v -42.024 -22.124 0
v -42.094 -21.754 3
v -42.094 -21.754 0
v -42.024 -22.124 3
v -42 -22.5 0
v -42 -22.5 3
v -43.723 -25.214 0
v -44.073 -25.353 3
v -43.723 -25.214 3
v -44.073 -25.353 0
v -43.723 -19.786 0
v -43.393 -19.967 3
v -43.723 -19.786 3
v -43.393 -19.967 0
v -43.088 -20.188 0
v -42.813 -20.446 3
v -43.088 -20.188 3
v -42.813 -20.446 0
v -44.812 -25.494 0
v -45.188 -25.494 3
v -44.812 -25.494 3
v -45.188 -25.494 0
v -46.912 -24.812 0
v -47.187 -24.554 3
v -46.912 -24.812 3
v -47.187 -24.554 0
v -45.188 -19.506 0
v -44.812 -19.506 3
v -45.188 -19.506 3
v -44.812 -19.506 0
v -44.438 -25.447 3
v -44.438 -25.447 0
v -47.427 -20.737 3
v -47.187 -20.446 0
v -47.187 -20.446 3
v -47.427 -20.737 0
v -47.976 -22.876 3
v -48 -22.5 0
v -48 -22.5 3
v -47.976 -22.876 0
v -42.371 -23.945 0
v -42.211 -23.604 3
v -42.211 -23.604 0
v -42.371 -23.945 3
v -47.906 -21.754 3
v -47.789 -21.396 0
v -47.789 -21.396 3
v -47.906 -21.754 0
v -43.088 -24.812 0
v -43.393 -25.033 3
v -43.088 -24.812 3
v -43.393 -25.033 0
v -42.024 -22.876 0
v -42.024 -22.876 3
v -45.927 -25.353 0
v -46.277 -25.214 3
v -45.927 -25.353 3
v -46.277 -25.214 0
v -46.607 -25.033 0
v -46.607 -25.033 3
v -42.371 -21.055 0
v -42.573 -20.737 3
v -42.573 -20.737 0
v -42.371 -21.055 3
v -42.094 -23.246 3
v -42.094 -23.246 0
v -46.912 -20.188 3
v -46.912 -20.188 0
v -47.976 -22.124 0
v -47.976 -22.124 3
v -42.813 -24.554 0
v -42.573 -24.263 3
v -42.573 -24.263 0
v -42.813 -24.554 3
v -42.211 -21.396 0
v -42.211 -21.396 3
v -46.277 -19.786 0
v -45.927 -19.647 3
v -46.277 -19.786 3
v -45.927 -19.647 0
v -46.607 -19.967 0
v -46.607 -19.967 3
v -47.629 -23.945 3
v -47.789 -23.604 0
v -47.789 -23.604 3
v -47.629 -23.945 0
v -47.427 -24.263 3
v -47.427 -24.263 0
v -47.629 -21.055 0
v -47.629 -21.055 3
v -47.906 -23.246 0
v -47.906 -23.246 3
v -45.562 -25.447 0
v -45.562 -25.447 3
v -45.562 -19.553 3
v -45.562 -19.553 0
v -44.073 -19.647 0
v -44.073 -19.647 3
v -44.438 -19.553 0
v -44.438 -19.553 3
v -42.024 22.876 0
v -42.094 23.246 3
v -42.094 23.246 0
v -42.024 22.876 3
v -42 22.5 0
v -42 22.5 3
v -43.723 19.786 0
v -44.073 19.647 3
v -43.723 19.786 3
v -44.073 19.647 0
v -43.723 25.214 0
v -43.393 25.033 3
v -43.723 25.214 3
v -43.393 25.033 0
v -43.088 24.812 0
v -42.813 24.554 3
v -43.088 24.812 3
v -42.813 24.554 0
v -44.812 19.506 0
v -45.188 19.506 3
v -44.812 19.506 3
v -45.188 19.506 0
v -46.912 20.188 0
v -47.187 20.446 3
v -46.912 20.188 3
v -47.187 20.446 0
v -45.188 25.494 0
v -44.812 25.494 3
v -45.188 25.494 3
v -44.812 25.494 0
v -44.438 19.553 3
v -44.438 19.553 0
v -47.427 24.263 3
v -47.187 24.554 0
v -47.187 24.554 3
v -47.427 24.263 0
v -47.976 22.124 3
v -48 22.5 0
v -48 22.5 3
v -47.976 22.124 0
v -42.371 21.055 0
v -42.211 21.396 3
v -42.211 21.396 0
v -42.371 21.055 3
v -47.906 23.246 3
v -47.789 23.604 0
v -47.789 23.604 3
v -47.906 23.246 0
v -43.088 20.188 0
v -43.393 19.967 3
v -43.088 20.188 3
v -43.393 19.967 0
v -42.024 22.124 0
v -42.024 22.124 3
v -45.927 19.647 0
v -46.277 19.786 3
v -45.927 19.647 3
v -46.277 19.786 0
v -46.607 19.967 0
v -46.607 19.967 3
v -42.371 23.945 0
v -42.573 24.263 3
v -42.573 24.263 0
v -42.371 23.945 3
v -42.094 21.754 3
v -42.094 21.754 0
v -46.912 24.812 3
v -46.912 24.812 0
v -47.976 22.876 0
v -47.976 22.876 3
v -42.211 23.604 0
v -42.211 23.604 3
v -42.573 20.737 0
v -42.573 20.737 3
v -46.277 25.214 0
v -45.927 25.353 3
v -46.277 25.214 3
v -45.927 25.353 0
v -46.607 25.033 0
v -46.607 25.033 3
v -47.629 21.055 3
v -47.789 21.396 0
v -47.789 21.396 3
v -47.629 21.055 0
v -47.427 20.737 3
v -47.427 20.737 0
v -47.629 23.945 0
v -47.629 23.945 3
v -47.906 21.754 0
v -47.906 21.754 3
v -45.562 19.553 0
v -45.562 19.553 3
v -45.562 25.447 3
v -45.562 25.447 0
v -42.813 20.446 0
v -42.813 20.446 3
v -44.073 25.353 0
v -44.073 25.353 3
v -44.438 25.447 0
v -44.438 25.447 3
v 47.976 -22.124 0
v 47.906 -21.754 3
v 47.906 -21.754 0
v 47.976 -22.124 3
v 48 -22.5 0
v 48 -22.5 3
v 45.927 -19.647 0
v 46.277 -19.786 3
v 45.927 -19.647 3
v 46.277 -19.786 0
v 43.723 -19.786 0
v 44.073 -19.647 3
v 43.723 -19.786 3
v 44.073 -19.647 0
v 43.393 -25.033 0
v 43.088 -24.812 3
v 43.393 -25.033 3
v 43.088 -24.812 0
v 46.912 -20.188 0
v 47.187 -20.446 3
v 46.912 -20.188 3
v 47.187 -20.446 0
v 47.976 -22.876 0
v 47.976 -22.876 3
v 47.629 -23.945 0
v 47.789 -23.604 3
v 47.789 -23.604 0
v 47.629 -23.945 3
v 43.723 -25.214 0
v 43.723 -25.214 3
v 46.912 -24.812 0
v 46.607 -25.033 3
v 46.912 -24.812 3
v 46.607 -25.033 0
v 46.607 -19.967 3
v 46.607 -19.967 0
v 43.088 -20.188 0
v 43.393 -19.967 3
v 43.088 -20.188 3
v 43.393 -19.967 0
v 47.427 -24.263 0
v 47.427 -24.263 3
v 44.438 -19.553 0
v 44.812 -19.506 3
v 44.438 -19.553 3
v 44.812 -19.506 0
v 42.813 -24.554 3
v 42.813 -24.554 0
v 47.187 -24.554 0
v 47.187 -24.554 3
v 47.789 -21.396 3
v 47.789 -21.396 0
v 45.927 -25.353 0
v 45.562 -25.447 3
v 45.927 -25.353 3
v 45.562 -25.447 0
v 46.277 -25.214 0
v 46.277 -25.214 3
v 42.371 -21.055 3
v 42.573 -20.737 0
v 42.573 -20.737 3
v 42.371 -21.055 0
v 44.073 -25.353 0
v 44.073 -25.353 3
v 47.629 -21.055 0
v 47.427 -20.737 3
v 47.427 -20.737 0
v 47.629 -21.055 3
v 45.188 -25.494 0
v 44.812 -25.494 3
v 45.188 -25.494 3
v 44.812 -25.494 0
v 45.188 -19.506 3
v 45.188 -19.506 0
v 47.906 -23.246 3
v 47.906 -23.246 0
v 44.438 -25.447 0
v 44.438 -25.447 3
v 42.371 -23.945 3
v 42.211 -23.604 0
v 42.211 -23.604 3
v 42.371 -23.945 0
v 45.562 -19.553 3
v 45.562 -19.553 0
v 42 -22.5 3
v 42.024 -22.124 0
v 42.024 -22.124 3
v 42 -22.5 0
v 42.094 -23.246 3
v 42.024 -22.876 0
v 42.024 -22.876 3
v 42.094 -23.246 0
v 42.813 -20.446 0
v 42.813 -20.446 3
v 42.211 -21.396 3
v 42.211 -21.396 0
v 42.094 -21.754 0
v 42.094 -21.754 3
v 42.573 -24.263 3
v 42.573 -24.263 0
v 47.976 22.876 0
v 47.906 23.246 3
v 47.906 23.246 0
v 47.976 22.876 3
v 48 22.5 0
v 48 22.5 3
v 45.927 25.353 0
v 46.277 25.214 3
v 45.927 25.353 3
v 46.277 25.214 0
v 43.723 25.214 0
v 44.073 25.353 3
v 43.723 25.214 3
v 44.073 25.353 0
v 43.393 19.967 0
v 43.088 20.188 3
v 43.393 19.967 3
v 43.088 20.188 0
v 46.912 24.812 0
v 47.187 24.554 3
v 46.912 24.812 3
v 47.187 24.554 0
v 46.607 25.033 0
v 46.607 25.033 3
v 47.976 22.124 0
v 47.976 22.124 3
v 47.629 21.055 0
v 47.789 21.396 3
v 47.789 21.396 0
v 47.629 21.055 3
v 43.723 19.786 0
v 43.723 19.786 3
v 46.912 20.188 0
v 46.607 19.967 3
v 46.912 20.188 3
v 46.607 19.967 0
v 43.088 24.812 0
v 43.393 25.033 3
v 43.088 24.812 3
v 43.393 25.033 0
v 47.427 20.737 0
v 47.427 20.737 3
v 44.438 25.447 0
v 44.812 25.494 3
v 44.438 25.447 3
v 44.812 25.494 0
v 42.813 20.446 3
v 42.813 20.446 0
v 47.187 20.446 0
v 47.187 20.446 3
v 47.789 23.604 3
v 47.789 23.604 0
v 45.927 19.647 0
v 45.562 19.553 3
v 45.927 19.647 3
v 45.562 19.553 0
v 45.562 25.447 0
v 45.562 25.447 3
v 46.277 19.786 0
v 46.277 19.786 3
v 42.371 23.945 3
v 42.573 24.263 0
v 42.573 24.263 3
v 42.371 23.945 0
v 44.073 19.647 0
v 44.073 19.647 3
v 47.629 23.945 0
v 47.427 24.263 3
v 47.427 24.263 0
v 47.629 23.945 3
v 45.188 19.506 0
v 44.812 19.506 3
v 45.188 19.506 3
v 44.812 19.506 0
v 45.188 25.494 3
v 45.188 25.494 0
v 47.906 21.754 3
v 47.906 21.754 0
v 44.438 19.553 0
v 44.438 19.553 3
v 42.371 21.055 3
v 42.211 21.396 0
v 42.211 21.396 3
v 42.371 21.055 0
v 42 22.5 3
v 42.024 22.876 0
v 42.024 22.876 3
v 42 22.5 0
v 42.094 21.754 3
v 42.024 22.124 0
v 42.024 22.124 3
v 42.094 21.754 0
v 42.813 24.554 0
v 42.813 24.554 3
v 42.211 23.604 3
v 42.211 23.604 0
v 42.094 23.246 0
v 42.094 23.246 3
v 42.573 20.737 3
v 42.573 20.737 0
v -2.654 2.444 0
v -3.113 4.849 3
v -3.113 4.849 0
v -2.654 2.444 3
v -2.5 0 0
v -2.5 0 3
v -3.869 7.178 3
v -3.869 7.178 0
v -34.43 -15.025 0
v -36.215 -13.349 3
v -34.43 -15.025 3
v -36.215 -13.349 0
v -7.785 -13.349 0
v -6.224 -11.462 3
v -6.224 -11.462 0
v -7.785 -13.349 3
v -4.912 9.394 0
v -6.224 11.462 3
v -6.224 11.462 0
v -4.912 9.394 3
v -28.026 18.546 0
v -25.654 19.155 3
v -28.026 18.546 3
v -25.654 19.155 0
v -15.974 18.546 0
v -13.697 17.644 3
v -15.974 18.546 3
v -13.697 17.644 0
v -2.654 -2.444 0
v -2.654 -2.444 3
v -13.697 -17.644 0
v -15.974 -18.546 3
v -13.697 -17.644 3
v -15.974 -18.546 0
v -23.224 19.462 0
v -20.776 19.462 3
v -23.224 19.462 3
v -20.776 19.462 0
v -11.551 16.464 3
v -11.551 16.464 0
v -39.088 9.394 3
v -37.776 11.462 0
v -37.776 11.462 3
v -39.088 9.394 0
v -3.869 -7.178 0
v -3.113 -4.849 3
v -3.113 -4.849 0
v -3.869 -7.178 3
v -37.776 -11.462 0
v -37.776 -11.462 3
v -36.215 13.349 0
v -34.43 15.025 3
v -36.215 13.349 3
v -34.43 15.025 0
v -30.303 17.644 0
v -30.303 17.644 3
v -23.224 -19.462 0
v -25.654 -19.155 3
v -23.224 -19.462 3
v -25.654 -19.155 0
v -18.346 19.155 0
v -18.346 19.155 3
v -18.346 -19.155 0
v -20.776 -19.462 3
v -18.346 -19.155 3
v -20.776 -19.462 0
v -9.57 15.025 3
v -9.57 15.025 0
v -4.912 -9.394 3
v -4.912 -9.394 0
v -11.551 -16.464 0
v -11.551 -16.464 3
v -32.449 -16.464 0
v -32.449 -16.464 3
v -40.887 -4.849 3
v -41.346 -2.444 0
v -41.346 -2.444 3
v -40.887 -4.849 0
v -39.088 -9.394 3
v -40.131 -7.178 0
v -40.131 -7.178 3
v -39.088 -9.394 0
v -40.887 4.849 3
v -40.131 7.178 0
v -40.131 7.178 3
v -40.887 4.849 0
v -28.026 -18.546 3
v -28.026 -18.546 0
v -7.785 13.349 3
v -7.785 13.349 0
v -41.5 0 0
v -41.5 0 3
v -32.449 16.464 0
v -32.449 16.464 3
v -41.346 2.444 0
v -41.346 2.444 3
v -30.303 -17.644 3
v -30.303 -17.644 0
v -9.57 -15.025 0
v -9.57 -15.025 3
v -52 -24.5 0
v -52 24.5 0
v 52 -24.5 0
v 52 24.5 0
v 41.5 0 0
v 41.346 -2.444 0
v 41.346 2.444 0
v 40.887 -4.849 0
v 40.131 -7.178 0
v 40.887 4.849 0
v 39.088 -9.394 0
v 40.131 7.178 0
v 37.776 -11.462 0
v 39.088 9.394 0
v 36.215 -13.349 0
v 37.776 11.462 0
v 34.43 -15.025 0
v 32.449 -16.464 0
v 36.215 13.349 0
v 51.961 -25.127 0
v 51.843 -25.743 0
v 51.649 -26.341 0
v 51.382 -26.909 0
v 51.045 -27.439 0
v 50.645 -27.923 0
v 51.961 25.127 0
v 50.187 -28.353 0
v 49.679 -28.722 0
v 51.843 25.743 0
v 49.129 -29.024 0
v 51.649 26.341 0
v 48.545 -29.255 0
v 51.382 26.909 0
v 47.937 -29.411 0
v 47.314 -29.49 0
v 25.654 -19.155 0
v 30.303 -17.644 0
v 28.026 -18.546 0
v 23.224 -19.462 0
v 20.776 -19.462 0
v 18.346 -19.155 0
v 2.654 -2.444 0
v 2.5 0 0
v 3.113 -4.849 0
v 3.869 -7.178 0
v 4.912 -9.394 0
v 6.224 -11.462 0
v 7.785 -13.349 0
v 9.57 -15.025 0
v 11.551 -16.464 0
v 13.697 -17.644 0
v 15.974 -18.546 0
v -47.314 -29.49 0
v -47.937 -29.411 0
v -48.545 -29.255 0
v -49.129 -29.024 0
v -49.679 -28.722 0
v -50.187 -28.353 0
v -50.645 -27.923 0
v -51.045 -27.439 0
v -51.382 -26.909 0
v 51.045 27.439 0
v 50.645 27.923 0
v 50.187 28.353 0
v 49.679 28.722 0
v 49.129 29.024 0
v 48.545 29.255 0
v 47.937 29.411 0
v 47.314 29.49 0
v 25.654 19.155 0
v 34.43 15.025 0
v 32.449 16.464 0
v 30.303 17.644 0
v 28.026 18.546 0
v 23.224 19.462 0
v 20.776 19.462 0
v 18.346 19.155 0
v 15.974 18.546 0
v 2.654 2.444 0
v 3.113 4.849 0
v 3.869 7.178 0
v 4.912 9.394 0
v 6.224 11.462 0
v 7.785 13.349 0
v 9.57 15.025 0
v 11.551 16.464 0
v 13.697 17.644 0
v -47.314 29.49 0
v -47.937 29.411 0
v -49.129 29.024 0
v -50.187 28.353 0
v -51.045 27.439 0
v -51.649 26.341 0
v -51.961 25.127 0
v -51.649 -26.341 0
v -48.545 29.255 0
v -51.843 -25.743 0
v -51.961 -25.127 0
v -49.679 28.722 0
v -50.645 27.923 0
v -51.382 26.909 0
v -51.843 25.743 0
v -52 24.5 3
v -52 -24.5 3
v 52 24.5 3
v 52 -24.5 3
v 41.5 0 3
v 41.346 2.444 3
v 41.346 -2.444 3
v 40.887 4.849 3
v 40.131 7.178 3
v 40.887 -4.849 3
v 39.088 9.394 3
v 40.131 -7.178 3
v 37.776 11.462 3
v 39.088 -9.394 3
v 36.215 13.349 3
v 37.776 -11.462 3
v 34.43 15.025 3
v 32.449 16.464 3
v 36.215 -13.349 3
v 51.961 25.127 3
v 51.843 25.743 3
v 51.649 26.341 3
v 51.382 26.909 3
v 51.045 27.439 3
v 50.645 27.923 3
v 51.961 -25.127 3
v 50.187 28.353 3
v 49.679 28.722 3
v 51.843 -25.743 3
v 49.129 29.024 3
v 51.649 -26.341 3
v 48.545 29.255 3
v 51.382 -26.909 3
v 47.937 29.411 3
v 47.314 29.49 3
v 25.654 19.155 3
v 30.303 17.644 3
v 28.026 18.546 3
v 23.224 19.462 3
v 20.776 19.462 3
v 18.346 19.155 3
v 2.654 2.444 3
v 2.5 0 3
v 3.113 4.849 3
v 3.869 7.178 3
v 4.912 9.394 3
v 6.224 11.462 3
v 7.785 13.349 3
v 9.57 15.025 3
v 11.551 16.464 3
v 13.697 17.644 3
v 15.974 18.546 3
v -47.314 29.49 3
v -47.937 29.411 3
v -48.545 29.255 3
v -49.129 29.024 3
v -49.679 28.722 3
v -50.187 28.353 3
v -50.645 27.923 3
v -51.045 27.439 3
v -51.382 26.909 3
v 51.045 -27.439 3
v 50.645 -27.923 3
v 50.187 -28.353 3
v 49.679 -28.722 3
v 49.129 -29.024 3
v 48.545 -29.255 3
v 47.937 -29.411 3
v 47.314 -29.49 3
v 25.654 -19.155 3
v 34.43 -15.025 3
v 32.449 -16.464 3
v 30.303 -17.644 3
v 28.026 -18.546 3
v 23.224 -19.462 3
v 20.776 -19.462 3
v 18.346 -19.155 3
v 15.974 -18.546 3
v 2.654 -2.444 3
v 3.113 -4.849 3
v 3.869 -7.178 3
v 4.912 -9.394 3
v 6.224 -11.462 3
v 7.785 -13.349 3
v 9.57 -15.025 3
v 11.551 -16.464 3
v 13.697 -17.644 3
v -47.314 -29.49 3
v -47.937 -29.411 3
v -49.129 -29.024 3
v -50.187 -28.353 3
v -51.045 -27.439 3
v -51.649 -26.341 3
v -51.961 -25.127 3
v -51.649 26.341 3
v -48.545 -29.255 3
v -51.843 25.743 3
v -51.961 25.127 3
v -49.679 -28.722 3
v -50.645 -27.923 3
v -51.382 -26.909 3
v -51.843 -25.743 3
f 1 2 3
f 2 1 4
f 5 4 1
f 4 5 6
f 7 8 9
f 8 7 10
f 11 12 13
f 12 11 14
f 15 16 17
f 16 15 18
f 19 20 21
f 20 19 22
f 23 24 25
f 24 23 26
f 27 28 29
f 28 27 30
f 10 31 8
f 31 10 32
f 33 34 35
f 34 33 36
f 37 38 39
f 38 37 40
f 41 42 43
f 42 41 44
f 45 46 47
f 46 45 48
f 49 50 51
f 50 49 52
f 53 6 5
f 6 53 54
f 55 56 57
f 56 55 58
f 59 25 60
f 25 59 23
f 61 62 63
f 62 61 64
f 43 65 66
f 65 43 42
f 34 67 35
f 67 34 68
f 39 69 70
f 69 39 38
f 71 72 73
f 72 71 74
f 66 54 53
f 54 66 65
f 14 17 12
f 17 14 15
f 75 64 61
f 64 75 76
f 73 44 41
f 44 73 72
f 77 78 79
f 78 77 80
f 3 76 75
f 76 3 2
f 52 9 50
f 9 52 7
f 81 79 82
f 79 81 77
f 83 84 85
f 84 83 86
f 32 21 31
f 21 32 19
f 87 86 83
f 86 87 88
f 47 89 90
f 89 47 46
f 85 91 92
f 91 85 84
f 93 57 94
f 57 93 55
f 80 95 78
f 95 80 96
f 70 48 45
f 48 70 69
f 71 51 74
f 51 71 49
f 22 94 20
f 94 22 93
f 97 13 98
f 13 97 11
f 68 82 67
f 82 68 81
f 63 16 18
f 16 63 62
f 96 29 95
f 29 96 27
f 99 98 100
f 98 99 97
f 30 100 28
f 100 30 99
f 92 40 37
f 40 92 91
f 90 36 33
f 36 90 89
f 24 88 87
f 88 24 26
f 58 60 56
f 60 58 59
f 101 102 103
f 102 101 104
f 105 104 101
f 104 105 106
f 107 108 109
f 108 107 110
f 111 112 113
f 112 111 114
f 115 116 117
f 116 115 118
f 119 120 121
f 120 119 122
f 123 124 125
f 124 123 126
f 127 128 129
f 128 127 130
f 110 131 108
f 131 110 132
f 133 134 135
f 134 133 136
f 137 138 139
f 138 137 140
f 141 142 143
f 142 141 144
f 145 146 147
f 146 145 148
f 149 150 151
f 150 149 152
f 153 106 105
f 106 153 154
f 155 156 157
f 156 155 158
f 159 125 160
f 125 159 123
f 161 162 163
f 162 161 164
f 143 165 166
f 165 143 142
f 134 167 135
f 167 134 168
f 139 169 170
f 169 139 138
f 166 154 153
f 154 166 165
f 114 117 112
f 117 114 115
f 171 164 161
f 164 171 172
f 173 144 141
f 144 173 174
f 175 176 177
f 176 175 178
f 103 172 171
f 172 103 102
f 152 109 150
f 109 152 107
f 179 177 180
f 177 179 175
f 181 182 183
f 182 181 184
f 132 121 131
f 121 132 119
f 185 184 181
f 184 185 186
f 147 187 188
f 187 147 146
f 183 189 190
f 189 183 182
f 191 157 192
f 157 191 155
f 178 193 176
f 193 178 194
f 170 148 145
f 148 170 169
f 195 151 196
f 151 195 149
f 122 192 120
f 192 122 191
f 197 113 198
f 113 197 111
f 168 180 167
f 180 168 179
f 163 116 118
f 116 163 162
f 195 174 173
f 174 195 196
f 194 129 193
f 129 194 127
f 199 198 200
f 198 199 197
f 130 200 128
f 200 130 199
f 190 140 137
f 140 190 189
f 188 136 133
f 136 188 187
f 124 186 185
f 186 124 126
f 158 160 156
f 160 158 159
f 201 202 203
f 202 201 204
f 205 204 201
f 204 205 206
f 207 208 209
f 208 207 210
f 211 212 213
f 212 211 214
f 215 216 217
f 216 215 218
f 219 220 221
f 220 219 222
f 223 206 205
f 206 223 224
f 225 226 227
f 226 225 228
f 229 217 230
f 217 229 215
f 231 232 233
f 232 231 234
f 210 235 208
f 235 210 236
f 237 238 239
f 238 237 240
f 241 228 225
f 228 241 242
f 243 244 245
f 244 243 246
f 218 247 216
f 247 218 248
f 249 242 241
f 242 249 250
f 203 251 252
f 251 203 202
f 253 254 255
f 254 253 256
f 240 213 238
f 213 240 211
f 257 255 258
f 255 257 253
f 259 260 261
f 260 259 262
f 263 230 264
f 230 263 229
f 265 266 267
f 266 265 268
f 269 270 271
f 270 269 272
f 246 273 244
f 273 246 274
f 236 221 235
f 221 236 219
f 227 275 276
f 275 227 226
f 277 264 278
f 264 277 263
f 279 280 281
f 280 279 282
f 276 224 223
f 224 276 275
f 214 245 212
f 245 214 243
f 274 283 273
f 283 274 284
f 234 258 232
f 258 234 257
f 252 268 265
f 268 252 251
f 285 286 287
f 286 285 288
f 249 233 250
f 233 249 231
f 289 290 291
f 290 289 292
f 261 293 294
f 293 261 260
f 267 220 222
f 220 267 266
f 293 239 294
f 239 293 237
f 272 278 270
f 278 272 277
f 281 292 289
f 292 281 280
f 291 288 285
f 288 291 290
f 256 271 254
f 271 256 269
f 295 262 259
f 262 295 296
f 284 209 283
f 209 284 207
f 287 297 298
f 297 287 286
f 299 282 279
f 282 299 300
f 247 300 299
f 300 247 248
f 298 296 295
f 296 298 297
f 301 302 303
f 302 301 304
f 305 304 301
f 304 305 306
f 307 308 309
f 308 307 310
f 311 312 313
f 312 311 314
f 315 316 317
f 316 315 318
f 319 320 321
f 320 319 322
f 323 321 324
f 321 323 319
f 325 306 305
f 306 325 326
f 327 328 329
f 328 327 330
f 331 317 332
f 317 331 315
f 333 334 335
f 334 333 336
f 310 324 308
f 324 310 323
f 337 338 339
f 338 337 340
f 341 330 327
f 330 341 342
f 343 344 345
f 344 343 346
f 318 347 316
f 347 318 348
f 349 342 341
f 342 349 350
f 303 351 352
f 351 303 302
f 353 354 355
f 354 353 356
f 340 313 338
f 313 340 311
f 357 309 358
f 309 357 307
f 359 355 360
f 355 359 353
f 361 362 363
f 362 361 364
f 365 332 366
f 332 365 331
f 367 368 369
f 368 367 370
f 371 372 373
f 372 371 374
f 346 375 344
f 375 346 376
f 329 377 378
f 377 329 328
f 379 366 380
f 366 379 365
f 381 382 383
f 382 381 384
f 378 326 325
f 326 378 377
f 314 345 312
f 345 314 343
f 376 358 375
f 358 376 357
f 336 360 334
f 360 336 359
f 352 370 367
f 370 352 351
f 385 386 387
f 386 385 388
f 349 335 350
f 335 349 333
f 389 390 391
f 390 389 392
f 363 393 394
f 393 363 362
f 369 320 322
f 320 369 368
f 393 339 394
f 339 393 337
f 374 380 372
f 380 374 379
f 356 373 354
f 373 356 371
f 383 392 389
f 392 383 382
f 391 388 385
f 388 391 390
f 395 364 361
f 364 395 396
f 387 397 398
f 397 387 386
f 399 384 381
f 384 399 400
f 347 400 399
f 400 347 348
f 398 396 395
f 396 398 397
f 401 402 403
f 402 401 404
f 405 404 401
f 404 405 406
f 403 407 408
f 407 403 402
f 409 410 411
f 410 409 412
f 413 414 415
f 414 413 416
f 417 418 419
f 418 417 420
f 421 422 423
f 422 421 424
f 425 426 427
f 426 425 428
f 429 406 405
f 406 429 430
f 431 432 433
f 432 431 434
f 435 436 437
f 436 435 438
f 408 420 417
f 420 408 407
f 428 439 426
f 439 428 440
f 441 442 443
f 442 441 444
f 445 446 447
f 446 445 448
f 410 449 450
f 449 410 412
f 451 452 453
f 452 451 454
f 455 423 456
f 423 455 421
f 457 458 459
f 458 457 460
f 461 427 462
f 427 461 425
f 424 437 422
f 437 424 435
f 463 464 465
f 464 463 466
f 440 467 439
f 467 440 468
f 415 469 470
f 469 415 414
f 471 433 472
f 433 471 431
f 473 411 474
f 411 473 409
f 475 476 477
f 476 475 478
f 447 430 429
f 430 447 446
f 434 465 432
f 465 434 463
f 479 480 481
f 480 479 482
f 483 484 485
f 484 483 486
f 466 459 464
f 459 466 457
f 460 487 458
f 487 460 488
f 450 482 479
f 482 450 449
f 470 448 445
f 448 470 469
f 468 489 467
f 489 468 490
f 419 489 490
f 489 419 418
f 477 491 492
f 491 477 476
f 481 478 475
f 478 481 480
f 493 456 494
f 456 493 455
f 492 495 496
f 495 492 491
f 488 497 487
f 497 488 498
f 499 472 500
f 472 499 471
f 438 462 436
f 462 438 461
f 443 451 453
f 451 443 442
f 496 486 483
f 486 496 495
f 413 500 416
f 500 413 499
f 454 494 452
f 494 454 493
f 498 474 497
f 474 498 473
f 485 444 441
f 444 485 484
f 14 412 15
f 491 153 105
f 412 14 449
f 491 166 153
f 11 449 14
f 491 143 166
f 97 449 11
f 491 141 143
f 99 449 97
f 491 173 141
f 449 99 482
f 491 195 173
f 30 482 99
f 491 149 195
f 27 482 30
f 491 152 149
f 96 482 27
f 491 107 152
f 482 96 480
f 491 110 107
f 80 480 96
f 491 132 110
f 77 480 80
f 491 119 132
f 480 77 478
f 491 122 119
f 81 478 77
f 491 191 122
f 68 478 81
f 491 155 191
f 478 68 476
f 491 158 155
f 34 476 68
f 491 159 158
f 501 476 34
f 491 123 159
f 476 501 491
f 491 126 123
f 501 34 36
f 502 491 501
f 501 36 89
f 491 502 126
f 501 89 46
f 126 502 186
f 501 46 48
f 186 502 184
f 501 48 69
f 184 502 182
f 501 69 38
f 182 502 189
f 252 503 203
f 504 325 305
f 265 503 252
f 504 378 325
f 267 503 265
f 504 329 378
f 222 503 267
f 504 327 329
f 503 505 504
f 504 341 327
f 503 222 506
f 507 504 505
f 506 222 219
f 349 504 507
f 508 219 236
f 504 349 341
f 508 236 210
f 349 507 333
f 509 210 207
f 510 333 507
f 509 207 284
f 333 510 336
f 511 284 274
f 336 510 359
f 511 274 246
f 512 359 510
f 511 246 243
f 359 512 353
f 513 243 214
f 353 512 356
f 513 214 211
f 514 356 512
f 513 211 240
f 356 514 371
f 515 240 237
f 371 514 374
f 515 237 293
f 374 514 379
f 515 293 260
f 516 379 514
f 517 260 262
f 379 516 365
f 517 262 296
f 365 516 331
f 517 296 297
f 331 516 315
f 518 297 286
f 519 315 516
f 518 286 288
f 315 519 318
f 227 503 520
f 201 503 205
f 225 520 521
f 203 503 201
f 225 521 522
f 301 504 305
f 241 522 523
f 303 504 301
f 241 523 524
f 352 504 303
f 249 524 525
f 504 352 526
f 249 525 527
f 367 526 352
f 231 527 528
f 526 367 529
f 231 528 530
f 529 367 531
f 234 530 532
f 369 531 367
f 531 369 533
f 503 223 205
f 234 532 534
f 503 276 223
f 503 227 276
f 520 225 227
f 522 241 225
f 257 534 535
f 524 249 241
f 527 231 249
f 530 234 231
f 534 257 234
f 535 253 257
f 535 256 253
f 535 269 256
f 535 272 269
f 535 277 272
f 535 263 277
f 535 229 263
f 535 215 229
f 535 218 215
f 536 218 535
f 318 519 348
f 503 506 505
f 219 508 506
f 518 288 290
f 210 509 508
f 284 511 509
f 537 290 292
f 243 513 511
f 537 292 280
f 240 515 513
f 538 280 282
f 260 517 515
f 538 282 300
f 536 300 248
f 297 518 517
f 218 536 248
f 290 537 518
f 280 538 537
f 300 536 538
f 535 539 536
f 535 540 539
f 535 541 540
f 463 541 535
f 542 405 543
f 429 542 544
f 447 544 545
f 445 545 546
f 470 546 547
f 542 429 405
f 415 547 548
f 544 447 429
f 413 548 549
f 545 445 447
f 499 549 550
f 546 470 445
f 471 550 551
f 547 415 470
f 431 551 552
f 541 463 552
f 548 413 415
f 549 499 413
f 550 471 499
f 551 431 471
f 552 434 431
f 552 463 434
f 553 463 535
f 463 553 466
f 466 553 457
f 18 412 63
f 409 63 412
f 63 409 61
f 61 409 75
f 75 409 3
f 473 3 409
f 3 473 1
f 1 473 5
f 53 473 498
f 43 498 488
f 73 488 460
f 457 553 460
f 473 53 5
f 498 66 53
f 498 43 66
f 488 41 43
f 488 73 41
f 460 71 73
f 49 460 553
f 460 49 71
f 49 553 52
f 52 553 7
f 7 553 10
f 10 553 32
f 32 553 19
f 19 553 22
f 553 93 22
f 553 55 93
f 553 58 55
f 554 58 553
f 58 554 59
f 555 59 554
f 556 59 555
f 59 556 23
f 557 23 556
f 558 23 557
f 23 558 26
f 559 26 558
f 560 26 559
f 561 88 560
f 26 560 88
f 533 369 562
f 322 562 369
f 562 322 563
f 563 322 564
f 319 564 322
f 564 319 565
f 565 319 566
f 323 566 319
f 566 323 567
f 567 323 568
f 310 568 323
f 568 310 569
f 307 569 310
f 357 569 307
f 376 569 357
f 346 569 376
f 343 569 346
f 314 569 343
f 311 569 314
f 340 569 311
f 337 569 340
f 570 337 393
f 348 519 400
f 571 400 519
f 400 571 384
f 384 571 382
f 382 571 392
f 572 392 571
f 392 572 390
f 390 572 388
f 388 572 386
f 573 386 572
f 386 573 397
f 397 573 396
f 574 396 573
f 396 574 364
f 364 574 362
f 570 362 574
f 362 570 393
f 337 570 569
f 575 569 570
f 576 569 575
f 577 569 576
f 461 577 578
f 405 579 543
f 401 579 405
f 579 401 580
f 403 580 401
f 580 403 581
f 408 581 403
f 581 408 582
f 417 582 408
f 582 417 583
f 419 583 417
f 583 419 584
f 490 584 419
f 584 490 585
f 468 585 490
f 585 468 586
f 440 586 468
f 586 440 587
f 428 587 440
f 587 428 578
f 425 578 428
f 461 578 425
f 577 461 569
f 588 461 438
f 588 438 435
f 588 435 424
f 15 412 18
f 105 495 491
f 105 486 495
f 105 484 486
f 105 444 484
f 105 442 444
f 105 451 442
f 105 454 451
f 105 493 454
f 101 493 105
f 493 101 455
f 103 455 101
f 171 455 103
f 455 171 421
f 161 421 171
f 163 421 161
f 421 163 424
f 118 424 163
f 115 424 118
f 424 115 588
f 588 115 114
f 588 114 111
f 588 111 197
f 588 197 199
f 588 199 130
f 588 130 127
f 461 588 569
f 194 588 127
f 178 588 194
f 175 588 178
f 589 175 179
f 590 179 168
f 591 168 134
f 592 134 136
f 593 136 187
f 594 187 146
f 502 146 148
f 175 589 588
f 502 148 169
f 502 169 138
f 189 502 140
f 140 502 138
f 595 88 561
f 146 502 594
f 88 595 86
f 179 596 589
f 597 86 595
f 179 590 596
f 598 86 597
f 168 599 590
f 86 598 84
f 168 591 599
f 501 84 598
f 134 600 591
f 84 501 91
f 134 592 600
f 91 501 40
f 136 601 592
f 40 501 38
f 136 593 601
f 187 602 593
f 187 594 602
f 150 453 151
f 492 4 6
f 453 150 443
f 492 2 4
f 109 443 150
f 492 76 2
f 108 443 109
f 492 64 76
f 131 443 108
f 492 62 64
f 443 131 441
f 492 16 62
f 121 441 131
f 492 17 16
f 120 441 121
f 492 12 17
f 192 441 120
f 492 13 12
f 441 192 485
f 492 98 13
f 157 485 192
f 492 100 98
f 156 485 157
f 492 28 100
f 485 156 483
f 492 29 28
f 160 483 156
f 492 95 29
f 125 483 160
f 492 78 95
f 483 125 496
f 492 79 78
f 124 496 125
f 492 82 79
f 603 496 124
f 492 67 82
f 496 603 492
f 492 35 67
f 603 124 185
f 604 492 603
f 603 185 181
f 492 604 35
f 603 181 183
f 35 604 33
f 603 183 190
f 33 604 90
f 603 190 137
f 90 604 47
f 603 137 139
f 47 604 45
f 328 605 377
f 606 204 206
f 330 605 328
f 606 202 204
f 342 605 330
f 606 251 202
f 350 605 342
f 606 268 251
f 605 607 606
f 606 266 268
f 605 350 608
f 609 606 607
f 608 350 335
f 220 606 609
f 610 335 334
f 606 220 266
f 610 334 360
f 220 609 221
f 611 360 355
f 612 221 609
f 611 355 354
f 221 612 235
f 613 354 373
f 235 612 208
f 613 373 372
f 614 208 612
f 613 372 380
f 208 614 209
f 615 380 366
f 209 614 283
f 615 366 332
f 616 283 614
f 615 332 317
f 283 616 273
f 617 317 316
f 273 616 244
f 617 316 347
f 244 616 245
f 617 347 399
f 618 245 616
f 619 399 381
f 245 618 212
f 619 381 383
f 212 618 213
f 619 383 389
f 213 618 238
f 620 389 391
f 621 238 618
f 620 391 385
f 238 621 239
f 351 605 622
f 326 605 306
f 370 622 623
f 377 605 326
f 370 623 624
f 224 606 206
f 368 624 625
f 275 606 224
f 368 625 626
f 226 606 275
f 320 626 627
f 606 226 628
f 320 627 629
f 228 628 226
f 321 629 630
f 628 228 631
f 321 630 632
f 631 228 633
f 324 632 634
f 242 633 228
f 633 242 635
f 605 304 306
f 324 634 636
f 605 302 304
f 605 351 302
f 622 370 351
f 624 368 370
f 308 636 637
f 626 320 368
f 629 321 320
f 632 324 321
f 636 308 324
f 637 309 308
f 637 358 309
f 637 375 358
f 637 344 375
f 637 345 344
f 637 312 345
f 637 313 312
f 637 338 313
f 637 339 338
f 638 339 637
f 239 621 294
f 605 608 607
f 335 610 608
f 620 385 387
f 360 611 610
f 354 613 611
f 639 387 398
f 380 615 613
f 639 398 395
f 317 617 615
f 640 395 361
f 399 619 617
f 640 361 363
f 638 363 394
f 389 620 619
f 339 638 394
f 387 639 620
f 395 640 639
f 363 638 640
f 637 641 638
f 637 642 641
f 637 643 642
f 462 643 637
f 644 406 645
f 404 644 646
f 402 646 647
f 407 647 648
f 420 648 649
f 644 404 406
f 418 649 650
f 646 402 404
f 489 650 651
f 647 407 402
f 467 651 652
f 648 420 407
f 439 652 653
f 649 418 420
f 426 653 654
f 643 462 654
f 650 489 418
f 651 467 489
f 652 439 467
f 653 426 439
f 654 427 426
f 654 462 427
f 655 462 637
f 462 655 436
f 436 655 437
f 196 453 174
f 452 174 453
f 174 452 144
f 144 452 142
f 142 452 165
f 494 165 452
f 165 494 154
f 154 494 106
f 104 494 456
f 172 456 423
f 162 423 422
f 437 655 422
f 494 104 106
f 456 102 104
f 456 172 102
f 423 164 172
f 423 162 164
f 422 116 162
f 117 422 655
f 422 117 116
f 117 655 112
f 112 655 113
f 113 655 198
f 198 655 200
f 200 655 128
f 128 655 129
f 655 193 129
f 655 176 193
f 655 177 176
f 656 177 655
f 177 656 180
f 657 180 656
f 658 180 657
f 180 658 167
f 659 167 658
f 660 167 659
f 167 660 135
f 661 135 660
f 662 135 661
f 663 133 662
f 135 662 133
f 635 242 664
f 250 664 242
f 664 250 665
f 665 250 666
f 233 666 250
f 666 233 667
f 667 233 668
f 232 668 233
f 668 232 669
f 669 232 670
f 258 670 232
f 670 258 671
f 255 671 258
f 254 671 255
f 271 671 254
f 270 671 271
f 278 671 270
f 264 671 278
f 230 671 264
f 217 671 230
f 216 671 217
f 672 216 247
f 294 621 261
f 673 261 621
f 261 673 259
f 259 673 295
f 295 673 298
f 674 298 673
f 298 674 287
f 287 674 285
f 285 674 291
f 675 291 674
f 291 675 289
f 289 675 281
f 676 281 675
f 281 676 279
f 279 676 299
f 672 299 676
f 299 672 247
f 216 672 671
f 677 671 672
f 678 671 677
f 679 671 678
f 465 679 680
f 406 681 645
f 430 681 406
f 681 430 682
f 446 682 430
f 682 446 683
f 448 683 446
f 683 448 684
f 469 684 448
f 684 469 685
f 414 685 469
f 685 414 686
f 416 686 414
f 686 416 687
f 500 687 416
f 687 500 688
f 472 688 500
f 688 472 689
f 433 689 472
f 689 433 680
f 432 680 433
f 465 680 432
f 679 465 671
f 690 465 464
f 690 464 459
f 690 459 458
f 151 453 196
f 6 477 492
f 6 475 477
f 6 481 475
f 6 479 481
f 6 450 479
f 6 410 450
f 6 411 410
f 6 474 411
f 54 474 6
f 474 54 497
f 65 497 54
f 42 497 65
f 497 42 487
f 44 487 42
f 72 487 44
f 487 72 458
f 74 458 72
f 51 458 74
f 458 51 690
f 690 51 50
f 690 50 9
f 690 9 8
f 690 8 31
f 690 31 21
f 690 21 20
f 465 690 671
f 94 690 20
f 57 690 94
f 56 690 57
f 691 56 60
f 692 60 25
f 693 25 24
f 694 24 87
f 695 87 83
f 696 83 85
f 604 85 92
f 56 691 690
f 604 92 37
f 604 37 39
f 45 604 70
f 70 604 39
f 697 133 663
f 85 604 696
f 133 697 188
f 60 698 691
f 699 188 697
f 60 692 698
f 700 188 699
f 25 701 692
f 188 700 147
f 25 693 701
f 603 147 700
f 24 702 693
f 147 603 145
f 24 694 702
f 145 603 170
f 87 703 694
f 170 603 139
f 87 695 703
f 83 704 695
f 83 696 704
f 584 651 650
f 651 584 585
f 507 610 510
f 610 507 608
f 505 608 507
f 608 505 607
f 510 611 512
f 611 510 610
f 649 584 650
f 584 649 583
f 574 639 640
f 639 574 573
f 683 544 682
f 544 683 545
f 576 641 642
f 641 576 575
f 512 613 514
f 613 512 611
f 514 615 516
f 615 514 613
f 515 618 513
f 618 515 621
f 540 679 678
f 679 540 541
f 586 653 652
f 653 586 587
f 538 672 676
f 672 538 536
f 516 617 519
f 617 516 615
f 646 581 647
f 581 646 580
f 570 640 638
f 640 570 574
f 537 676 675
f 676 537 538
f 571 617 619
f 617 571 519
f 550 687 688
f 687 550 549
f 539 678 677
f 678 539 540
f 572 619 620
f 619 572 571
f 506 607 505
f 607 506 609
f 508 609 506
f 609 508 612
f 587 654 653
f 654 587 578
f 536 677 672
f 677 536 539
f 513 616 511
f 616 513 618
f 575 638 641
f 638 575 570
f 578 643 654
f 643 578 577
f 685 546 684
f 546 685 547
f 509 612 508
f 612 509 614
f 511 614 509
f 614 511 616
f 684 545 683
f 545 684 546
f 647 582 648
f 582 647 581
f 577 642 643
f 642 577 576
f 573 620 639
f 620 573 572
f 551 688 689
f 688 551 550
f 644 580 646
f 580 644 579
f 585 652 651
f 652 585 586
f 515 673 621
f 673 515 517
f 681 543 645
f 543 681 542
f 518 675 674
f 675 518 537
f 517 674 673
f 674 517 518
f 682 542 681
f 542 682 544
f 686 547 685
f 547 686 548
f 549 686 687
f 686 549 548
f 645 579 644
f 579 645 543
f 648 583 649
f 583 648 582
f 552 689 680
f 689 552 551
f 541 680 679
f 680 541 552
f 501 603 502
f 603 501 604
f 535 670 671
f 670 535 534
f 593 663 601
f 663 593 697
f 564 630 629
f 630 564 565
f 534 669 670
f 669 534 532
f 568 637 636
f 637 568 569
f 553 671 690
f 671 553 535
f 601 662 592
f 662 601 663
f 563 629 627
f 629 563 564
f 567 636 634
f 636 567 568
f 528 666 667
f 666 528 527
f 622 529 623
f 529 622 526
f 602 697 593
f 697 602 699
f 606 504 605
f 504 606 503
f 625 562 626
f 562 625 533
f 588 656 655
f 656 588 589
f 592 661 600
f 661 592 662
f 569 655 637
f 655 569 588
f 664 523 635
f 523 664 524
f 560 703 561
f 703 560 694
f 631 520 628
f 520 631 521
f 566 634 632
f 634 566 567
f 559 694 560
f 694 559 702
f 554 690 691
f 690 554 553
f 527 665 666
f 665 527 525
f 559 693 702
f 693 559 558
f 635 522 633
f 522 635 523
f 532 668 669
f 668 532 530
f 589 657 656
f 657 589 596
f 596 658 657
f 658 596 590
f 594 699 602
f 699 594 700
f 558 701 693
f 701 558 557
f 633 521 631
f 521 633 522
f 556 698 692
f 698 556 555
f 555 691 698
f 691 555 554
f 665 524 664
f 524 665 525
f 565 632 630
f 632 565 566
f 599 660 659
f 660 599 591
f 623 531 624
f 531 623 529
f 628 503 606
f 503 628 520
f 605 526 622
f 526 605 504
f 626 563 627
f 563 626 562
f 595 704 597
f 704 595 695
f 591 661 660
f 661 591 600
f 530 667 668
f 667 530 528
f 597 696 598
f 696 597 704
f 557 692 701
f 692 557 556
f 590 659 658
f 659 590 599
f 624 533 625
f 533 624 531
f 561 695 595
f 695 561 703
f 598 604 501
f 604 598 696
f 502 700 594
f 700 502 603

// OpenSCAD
$fn = 50;


difference() {
	union() {
		hull() {
			translate(v = [-47.0000000000, 24.5000000000, 0]) {
				cylinder(h = 3, r = 5);
			}
			translate(v = [47.0000000000, 24.5000000000, 0]) {
				cylinder(h = 3, r = 5);
			}
			translate(v = [-47.0000000000, -24.5000000000, 0]) {
				cylinder(h = 3, r = 5);
			}
			translate(v = [47.0000000000, -24.5000000000, 0]) {
				cylinder(h = 3, r = 5);
			}
		}
	}
	union() {
		#translate(v = [-45.0000000000, -22.5000000000, -100.0000000000]) {
			cylinder(h = 200, r = 3.0000000000);
		}
		#translate(v = [-45.0000000000, 22.5000000000, -100.0000000000]) {
			cylinder(h = 200, r = 3.0000000000);
		}
		#translate(v = [45.0000000000, -22.5000000000, -100.0000000000]) {
			cylinder(h = 200, r = 3.0000000000);
		}
		#translate(v = [45.0000000000, 22.5000000000, -100.0000000000]) {
			cylinder(h = 200, r = 3.0000000000);
		}
		#translate(v = [-22.0000000000, 0, 0]) {
			cylinder(h = 3, r = 19.5000000000);
		}
		#translate(v = [22.0000000000, 0, 0]) {
			cylinder(h = 3, r = 19.5000000000);
		}
	}
}
